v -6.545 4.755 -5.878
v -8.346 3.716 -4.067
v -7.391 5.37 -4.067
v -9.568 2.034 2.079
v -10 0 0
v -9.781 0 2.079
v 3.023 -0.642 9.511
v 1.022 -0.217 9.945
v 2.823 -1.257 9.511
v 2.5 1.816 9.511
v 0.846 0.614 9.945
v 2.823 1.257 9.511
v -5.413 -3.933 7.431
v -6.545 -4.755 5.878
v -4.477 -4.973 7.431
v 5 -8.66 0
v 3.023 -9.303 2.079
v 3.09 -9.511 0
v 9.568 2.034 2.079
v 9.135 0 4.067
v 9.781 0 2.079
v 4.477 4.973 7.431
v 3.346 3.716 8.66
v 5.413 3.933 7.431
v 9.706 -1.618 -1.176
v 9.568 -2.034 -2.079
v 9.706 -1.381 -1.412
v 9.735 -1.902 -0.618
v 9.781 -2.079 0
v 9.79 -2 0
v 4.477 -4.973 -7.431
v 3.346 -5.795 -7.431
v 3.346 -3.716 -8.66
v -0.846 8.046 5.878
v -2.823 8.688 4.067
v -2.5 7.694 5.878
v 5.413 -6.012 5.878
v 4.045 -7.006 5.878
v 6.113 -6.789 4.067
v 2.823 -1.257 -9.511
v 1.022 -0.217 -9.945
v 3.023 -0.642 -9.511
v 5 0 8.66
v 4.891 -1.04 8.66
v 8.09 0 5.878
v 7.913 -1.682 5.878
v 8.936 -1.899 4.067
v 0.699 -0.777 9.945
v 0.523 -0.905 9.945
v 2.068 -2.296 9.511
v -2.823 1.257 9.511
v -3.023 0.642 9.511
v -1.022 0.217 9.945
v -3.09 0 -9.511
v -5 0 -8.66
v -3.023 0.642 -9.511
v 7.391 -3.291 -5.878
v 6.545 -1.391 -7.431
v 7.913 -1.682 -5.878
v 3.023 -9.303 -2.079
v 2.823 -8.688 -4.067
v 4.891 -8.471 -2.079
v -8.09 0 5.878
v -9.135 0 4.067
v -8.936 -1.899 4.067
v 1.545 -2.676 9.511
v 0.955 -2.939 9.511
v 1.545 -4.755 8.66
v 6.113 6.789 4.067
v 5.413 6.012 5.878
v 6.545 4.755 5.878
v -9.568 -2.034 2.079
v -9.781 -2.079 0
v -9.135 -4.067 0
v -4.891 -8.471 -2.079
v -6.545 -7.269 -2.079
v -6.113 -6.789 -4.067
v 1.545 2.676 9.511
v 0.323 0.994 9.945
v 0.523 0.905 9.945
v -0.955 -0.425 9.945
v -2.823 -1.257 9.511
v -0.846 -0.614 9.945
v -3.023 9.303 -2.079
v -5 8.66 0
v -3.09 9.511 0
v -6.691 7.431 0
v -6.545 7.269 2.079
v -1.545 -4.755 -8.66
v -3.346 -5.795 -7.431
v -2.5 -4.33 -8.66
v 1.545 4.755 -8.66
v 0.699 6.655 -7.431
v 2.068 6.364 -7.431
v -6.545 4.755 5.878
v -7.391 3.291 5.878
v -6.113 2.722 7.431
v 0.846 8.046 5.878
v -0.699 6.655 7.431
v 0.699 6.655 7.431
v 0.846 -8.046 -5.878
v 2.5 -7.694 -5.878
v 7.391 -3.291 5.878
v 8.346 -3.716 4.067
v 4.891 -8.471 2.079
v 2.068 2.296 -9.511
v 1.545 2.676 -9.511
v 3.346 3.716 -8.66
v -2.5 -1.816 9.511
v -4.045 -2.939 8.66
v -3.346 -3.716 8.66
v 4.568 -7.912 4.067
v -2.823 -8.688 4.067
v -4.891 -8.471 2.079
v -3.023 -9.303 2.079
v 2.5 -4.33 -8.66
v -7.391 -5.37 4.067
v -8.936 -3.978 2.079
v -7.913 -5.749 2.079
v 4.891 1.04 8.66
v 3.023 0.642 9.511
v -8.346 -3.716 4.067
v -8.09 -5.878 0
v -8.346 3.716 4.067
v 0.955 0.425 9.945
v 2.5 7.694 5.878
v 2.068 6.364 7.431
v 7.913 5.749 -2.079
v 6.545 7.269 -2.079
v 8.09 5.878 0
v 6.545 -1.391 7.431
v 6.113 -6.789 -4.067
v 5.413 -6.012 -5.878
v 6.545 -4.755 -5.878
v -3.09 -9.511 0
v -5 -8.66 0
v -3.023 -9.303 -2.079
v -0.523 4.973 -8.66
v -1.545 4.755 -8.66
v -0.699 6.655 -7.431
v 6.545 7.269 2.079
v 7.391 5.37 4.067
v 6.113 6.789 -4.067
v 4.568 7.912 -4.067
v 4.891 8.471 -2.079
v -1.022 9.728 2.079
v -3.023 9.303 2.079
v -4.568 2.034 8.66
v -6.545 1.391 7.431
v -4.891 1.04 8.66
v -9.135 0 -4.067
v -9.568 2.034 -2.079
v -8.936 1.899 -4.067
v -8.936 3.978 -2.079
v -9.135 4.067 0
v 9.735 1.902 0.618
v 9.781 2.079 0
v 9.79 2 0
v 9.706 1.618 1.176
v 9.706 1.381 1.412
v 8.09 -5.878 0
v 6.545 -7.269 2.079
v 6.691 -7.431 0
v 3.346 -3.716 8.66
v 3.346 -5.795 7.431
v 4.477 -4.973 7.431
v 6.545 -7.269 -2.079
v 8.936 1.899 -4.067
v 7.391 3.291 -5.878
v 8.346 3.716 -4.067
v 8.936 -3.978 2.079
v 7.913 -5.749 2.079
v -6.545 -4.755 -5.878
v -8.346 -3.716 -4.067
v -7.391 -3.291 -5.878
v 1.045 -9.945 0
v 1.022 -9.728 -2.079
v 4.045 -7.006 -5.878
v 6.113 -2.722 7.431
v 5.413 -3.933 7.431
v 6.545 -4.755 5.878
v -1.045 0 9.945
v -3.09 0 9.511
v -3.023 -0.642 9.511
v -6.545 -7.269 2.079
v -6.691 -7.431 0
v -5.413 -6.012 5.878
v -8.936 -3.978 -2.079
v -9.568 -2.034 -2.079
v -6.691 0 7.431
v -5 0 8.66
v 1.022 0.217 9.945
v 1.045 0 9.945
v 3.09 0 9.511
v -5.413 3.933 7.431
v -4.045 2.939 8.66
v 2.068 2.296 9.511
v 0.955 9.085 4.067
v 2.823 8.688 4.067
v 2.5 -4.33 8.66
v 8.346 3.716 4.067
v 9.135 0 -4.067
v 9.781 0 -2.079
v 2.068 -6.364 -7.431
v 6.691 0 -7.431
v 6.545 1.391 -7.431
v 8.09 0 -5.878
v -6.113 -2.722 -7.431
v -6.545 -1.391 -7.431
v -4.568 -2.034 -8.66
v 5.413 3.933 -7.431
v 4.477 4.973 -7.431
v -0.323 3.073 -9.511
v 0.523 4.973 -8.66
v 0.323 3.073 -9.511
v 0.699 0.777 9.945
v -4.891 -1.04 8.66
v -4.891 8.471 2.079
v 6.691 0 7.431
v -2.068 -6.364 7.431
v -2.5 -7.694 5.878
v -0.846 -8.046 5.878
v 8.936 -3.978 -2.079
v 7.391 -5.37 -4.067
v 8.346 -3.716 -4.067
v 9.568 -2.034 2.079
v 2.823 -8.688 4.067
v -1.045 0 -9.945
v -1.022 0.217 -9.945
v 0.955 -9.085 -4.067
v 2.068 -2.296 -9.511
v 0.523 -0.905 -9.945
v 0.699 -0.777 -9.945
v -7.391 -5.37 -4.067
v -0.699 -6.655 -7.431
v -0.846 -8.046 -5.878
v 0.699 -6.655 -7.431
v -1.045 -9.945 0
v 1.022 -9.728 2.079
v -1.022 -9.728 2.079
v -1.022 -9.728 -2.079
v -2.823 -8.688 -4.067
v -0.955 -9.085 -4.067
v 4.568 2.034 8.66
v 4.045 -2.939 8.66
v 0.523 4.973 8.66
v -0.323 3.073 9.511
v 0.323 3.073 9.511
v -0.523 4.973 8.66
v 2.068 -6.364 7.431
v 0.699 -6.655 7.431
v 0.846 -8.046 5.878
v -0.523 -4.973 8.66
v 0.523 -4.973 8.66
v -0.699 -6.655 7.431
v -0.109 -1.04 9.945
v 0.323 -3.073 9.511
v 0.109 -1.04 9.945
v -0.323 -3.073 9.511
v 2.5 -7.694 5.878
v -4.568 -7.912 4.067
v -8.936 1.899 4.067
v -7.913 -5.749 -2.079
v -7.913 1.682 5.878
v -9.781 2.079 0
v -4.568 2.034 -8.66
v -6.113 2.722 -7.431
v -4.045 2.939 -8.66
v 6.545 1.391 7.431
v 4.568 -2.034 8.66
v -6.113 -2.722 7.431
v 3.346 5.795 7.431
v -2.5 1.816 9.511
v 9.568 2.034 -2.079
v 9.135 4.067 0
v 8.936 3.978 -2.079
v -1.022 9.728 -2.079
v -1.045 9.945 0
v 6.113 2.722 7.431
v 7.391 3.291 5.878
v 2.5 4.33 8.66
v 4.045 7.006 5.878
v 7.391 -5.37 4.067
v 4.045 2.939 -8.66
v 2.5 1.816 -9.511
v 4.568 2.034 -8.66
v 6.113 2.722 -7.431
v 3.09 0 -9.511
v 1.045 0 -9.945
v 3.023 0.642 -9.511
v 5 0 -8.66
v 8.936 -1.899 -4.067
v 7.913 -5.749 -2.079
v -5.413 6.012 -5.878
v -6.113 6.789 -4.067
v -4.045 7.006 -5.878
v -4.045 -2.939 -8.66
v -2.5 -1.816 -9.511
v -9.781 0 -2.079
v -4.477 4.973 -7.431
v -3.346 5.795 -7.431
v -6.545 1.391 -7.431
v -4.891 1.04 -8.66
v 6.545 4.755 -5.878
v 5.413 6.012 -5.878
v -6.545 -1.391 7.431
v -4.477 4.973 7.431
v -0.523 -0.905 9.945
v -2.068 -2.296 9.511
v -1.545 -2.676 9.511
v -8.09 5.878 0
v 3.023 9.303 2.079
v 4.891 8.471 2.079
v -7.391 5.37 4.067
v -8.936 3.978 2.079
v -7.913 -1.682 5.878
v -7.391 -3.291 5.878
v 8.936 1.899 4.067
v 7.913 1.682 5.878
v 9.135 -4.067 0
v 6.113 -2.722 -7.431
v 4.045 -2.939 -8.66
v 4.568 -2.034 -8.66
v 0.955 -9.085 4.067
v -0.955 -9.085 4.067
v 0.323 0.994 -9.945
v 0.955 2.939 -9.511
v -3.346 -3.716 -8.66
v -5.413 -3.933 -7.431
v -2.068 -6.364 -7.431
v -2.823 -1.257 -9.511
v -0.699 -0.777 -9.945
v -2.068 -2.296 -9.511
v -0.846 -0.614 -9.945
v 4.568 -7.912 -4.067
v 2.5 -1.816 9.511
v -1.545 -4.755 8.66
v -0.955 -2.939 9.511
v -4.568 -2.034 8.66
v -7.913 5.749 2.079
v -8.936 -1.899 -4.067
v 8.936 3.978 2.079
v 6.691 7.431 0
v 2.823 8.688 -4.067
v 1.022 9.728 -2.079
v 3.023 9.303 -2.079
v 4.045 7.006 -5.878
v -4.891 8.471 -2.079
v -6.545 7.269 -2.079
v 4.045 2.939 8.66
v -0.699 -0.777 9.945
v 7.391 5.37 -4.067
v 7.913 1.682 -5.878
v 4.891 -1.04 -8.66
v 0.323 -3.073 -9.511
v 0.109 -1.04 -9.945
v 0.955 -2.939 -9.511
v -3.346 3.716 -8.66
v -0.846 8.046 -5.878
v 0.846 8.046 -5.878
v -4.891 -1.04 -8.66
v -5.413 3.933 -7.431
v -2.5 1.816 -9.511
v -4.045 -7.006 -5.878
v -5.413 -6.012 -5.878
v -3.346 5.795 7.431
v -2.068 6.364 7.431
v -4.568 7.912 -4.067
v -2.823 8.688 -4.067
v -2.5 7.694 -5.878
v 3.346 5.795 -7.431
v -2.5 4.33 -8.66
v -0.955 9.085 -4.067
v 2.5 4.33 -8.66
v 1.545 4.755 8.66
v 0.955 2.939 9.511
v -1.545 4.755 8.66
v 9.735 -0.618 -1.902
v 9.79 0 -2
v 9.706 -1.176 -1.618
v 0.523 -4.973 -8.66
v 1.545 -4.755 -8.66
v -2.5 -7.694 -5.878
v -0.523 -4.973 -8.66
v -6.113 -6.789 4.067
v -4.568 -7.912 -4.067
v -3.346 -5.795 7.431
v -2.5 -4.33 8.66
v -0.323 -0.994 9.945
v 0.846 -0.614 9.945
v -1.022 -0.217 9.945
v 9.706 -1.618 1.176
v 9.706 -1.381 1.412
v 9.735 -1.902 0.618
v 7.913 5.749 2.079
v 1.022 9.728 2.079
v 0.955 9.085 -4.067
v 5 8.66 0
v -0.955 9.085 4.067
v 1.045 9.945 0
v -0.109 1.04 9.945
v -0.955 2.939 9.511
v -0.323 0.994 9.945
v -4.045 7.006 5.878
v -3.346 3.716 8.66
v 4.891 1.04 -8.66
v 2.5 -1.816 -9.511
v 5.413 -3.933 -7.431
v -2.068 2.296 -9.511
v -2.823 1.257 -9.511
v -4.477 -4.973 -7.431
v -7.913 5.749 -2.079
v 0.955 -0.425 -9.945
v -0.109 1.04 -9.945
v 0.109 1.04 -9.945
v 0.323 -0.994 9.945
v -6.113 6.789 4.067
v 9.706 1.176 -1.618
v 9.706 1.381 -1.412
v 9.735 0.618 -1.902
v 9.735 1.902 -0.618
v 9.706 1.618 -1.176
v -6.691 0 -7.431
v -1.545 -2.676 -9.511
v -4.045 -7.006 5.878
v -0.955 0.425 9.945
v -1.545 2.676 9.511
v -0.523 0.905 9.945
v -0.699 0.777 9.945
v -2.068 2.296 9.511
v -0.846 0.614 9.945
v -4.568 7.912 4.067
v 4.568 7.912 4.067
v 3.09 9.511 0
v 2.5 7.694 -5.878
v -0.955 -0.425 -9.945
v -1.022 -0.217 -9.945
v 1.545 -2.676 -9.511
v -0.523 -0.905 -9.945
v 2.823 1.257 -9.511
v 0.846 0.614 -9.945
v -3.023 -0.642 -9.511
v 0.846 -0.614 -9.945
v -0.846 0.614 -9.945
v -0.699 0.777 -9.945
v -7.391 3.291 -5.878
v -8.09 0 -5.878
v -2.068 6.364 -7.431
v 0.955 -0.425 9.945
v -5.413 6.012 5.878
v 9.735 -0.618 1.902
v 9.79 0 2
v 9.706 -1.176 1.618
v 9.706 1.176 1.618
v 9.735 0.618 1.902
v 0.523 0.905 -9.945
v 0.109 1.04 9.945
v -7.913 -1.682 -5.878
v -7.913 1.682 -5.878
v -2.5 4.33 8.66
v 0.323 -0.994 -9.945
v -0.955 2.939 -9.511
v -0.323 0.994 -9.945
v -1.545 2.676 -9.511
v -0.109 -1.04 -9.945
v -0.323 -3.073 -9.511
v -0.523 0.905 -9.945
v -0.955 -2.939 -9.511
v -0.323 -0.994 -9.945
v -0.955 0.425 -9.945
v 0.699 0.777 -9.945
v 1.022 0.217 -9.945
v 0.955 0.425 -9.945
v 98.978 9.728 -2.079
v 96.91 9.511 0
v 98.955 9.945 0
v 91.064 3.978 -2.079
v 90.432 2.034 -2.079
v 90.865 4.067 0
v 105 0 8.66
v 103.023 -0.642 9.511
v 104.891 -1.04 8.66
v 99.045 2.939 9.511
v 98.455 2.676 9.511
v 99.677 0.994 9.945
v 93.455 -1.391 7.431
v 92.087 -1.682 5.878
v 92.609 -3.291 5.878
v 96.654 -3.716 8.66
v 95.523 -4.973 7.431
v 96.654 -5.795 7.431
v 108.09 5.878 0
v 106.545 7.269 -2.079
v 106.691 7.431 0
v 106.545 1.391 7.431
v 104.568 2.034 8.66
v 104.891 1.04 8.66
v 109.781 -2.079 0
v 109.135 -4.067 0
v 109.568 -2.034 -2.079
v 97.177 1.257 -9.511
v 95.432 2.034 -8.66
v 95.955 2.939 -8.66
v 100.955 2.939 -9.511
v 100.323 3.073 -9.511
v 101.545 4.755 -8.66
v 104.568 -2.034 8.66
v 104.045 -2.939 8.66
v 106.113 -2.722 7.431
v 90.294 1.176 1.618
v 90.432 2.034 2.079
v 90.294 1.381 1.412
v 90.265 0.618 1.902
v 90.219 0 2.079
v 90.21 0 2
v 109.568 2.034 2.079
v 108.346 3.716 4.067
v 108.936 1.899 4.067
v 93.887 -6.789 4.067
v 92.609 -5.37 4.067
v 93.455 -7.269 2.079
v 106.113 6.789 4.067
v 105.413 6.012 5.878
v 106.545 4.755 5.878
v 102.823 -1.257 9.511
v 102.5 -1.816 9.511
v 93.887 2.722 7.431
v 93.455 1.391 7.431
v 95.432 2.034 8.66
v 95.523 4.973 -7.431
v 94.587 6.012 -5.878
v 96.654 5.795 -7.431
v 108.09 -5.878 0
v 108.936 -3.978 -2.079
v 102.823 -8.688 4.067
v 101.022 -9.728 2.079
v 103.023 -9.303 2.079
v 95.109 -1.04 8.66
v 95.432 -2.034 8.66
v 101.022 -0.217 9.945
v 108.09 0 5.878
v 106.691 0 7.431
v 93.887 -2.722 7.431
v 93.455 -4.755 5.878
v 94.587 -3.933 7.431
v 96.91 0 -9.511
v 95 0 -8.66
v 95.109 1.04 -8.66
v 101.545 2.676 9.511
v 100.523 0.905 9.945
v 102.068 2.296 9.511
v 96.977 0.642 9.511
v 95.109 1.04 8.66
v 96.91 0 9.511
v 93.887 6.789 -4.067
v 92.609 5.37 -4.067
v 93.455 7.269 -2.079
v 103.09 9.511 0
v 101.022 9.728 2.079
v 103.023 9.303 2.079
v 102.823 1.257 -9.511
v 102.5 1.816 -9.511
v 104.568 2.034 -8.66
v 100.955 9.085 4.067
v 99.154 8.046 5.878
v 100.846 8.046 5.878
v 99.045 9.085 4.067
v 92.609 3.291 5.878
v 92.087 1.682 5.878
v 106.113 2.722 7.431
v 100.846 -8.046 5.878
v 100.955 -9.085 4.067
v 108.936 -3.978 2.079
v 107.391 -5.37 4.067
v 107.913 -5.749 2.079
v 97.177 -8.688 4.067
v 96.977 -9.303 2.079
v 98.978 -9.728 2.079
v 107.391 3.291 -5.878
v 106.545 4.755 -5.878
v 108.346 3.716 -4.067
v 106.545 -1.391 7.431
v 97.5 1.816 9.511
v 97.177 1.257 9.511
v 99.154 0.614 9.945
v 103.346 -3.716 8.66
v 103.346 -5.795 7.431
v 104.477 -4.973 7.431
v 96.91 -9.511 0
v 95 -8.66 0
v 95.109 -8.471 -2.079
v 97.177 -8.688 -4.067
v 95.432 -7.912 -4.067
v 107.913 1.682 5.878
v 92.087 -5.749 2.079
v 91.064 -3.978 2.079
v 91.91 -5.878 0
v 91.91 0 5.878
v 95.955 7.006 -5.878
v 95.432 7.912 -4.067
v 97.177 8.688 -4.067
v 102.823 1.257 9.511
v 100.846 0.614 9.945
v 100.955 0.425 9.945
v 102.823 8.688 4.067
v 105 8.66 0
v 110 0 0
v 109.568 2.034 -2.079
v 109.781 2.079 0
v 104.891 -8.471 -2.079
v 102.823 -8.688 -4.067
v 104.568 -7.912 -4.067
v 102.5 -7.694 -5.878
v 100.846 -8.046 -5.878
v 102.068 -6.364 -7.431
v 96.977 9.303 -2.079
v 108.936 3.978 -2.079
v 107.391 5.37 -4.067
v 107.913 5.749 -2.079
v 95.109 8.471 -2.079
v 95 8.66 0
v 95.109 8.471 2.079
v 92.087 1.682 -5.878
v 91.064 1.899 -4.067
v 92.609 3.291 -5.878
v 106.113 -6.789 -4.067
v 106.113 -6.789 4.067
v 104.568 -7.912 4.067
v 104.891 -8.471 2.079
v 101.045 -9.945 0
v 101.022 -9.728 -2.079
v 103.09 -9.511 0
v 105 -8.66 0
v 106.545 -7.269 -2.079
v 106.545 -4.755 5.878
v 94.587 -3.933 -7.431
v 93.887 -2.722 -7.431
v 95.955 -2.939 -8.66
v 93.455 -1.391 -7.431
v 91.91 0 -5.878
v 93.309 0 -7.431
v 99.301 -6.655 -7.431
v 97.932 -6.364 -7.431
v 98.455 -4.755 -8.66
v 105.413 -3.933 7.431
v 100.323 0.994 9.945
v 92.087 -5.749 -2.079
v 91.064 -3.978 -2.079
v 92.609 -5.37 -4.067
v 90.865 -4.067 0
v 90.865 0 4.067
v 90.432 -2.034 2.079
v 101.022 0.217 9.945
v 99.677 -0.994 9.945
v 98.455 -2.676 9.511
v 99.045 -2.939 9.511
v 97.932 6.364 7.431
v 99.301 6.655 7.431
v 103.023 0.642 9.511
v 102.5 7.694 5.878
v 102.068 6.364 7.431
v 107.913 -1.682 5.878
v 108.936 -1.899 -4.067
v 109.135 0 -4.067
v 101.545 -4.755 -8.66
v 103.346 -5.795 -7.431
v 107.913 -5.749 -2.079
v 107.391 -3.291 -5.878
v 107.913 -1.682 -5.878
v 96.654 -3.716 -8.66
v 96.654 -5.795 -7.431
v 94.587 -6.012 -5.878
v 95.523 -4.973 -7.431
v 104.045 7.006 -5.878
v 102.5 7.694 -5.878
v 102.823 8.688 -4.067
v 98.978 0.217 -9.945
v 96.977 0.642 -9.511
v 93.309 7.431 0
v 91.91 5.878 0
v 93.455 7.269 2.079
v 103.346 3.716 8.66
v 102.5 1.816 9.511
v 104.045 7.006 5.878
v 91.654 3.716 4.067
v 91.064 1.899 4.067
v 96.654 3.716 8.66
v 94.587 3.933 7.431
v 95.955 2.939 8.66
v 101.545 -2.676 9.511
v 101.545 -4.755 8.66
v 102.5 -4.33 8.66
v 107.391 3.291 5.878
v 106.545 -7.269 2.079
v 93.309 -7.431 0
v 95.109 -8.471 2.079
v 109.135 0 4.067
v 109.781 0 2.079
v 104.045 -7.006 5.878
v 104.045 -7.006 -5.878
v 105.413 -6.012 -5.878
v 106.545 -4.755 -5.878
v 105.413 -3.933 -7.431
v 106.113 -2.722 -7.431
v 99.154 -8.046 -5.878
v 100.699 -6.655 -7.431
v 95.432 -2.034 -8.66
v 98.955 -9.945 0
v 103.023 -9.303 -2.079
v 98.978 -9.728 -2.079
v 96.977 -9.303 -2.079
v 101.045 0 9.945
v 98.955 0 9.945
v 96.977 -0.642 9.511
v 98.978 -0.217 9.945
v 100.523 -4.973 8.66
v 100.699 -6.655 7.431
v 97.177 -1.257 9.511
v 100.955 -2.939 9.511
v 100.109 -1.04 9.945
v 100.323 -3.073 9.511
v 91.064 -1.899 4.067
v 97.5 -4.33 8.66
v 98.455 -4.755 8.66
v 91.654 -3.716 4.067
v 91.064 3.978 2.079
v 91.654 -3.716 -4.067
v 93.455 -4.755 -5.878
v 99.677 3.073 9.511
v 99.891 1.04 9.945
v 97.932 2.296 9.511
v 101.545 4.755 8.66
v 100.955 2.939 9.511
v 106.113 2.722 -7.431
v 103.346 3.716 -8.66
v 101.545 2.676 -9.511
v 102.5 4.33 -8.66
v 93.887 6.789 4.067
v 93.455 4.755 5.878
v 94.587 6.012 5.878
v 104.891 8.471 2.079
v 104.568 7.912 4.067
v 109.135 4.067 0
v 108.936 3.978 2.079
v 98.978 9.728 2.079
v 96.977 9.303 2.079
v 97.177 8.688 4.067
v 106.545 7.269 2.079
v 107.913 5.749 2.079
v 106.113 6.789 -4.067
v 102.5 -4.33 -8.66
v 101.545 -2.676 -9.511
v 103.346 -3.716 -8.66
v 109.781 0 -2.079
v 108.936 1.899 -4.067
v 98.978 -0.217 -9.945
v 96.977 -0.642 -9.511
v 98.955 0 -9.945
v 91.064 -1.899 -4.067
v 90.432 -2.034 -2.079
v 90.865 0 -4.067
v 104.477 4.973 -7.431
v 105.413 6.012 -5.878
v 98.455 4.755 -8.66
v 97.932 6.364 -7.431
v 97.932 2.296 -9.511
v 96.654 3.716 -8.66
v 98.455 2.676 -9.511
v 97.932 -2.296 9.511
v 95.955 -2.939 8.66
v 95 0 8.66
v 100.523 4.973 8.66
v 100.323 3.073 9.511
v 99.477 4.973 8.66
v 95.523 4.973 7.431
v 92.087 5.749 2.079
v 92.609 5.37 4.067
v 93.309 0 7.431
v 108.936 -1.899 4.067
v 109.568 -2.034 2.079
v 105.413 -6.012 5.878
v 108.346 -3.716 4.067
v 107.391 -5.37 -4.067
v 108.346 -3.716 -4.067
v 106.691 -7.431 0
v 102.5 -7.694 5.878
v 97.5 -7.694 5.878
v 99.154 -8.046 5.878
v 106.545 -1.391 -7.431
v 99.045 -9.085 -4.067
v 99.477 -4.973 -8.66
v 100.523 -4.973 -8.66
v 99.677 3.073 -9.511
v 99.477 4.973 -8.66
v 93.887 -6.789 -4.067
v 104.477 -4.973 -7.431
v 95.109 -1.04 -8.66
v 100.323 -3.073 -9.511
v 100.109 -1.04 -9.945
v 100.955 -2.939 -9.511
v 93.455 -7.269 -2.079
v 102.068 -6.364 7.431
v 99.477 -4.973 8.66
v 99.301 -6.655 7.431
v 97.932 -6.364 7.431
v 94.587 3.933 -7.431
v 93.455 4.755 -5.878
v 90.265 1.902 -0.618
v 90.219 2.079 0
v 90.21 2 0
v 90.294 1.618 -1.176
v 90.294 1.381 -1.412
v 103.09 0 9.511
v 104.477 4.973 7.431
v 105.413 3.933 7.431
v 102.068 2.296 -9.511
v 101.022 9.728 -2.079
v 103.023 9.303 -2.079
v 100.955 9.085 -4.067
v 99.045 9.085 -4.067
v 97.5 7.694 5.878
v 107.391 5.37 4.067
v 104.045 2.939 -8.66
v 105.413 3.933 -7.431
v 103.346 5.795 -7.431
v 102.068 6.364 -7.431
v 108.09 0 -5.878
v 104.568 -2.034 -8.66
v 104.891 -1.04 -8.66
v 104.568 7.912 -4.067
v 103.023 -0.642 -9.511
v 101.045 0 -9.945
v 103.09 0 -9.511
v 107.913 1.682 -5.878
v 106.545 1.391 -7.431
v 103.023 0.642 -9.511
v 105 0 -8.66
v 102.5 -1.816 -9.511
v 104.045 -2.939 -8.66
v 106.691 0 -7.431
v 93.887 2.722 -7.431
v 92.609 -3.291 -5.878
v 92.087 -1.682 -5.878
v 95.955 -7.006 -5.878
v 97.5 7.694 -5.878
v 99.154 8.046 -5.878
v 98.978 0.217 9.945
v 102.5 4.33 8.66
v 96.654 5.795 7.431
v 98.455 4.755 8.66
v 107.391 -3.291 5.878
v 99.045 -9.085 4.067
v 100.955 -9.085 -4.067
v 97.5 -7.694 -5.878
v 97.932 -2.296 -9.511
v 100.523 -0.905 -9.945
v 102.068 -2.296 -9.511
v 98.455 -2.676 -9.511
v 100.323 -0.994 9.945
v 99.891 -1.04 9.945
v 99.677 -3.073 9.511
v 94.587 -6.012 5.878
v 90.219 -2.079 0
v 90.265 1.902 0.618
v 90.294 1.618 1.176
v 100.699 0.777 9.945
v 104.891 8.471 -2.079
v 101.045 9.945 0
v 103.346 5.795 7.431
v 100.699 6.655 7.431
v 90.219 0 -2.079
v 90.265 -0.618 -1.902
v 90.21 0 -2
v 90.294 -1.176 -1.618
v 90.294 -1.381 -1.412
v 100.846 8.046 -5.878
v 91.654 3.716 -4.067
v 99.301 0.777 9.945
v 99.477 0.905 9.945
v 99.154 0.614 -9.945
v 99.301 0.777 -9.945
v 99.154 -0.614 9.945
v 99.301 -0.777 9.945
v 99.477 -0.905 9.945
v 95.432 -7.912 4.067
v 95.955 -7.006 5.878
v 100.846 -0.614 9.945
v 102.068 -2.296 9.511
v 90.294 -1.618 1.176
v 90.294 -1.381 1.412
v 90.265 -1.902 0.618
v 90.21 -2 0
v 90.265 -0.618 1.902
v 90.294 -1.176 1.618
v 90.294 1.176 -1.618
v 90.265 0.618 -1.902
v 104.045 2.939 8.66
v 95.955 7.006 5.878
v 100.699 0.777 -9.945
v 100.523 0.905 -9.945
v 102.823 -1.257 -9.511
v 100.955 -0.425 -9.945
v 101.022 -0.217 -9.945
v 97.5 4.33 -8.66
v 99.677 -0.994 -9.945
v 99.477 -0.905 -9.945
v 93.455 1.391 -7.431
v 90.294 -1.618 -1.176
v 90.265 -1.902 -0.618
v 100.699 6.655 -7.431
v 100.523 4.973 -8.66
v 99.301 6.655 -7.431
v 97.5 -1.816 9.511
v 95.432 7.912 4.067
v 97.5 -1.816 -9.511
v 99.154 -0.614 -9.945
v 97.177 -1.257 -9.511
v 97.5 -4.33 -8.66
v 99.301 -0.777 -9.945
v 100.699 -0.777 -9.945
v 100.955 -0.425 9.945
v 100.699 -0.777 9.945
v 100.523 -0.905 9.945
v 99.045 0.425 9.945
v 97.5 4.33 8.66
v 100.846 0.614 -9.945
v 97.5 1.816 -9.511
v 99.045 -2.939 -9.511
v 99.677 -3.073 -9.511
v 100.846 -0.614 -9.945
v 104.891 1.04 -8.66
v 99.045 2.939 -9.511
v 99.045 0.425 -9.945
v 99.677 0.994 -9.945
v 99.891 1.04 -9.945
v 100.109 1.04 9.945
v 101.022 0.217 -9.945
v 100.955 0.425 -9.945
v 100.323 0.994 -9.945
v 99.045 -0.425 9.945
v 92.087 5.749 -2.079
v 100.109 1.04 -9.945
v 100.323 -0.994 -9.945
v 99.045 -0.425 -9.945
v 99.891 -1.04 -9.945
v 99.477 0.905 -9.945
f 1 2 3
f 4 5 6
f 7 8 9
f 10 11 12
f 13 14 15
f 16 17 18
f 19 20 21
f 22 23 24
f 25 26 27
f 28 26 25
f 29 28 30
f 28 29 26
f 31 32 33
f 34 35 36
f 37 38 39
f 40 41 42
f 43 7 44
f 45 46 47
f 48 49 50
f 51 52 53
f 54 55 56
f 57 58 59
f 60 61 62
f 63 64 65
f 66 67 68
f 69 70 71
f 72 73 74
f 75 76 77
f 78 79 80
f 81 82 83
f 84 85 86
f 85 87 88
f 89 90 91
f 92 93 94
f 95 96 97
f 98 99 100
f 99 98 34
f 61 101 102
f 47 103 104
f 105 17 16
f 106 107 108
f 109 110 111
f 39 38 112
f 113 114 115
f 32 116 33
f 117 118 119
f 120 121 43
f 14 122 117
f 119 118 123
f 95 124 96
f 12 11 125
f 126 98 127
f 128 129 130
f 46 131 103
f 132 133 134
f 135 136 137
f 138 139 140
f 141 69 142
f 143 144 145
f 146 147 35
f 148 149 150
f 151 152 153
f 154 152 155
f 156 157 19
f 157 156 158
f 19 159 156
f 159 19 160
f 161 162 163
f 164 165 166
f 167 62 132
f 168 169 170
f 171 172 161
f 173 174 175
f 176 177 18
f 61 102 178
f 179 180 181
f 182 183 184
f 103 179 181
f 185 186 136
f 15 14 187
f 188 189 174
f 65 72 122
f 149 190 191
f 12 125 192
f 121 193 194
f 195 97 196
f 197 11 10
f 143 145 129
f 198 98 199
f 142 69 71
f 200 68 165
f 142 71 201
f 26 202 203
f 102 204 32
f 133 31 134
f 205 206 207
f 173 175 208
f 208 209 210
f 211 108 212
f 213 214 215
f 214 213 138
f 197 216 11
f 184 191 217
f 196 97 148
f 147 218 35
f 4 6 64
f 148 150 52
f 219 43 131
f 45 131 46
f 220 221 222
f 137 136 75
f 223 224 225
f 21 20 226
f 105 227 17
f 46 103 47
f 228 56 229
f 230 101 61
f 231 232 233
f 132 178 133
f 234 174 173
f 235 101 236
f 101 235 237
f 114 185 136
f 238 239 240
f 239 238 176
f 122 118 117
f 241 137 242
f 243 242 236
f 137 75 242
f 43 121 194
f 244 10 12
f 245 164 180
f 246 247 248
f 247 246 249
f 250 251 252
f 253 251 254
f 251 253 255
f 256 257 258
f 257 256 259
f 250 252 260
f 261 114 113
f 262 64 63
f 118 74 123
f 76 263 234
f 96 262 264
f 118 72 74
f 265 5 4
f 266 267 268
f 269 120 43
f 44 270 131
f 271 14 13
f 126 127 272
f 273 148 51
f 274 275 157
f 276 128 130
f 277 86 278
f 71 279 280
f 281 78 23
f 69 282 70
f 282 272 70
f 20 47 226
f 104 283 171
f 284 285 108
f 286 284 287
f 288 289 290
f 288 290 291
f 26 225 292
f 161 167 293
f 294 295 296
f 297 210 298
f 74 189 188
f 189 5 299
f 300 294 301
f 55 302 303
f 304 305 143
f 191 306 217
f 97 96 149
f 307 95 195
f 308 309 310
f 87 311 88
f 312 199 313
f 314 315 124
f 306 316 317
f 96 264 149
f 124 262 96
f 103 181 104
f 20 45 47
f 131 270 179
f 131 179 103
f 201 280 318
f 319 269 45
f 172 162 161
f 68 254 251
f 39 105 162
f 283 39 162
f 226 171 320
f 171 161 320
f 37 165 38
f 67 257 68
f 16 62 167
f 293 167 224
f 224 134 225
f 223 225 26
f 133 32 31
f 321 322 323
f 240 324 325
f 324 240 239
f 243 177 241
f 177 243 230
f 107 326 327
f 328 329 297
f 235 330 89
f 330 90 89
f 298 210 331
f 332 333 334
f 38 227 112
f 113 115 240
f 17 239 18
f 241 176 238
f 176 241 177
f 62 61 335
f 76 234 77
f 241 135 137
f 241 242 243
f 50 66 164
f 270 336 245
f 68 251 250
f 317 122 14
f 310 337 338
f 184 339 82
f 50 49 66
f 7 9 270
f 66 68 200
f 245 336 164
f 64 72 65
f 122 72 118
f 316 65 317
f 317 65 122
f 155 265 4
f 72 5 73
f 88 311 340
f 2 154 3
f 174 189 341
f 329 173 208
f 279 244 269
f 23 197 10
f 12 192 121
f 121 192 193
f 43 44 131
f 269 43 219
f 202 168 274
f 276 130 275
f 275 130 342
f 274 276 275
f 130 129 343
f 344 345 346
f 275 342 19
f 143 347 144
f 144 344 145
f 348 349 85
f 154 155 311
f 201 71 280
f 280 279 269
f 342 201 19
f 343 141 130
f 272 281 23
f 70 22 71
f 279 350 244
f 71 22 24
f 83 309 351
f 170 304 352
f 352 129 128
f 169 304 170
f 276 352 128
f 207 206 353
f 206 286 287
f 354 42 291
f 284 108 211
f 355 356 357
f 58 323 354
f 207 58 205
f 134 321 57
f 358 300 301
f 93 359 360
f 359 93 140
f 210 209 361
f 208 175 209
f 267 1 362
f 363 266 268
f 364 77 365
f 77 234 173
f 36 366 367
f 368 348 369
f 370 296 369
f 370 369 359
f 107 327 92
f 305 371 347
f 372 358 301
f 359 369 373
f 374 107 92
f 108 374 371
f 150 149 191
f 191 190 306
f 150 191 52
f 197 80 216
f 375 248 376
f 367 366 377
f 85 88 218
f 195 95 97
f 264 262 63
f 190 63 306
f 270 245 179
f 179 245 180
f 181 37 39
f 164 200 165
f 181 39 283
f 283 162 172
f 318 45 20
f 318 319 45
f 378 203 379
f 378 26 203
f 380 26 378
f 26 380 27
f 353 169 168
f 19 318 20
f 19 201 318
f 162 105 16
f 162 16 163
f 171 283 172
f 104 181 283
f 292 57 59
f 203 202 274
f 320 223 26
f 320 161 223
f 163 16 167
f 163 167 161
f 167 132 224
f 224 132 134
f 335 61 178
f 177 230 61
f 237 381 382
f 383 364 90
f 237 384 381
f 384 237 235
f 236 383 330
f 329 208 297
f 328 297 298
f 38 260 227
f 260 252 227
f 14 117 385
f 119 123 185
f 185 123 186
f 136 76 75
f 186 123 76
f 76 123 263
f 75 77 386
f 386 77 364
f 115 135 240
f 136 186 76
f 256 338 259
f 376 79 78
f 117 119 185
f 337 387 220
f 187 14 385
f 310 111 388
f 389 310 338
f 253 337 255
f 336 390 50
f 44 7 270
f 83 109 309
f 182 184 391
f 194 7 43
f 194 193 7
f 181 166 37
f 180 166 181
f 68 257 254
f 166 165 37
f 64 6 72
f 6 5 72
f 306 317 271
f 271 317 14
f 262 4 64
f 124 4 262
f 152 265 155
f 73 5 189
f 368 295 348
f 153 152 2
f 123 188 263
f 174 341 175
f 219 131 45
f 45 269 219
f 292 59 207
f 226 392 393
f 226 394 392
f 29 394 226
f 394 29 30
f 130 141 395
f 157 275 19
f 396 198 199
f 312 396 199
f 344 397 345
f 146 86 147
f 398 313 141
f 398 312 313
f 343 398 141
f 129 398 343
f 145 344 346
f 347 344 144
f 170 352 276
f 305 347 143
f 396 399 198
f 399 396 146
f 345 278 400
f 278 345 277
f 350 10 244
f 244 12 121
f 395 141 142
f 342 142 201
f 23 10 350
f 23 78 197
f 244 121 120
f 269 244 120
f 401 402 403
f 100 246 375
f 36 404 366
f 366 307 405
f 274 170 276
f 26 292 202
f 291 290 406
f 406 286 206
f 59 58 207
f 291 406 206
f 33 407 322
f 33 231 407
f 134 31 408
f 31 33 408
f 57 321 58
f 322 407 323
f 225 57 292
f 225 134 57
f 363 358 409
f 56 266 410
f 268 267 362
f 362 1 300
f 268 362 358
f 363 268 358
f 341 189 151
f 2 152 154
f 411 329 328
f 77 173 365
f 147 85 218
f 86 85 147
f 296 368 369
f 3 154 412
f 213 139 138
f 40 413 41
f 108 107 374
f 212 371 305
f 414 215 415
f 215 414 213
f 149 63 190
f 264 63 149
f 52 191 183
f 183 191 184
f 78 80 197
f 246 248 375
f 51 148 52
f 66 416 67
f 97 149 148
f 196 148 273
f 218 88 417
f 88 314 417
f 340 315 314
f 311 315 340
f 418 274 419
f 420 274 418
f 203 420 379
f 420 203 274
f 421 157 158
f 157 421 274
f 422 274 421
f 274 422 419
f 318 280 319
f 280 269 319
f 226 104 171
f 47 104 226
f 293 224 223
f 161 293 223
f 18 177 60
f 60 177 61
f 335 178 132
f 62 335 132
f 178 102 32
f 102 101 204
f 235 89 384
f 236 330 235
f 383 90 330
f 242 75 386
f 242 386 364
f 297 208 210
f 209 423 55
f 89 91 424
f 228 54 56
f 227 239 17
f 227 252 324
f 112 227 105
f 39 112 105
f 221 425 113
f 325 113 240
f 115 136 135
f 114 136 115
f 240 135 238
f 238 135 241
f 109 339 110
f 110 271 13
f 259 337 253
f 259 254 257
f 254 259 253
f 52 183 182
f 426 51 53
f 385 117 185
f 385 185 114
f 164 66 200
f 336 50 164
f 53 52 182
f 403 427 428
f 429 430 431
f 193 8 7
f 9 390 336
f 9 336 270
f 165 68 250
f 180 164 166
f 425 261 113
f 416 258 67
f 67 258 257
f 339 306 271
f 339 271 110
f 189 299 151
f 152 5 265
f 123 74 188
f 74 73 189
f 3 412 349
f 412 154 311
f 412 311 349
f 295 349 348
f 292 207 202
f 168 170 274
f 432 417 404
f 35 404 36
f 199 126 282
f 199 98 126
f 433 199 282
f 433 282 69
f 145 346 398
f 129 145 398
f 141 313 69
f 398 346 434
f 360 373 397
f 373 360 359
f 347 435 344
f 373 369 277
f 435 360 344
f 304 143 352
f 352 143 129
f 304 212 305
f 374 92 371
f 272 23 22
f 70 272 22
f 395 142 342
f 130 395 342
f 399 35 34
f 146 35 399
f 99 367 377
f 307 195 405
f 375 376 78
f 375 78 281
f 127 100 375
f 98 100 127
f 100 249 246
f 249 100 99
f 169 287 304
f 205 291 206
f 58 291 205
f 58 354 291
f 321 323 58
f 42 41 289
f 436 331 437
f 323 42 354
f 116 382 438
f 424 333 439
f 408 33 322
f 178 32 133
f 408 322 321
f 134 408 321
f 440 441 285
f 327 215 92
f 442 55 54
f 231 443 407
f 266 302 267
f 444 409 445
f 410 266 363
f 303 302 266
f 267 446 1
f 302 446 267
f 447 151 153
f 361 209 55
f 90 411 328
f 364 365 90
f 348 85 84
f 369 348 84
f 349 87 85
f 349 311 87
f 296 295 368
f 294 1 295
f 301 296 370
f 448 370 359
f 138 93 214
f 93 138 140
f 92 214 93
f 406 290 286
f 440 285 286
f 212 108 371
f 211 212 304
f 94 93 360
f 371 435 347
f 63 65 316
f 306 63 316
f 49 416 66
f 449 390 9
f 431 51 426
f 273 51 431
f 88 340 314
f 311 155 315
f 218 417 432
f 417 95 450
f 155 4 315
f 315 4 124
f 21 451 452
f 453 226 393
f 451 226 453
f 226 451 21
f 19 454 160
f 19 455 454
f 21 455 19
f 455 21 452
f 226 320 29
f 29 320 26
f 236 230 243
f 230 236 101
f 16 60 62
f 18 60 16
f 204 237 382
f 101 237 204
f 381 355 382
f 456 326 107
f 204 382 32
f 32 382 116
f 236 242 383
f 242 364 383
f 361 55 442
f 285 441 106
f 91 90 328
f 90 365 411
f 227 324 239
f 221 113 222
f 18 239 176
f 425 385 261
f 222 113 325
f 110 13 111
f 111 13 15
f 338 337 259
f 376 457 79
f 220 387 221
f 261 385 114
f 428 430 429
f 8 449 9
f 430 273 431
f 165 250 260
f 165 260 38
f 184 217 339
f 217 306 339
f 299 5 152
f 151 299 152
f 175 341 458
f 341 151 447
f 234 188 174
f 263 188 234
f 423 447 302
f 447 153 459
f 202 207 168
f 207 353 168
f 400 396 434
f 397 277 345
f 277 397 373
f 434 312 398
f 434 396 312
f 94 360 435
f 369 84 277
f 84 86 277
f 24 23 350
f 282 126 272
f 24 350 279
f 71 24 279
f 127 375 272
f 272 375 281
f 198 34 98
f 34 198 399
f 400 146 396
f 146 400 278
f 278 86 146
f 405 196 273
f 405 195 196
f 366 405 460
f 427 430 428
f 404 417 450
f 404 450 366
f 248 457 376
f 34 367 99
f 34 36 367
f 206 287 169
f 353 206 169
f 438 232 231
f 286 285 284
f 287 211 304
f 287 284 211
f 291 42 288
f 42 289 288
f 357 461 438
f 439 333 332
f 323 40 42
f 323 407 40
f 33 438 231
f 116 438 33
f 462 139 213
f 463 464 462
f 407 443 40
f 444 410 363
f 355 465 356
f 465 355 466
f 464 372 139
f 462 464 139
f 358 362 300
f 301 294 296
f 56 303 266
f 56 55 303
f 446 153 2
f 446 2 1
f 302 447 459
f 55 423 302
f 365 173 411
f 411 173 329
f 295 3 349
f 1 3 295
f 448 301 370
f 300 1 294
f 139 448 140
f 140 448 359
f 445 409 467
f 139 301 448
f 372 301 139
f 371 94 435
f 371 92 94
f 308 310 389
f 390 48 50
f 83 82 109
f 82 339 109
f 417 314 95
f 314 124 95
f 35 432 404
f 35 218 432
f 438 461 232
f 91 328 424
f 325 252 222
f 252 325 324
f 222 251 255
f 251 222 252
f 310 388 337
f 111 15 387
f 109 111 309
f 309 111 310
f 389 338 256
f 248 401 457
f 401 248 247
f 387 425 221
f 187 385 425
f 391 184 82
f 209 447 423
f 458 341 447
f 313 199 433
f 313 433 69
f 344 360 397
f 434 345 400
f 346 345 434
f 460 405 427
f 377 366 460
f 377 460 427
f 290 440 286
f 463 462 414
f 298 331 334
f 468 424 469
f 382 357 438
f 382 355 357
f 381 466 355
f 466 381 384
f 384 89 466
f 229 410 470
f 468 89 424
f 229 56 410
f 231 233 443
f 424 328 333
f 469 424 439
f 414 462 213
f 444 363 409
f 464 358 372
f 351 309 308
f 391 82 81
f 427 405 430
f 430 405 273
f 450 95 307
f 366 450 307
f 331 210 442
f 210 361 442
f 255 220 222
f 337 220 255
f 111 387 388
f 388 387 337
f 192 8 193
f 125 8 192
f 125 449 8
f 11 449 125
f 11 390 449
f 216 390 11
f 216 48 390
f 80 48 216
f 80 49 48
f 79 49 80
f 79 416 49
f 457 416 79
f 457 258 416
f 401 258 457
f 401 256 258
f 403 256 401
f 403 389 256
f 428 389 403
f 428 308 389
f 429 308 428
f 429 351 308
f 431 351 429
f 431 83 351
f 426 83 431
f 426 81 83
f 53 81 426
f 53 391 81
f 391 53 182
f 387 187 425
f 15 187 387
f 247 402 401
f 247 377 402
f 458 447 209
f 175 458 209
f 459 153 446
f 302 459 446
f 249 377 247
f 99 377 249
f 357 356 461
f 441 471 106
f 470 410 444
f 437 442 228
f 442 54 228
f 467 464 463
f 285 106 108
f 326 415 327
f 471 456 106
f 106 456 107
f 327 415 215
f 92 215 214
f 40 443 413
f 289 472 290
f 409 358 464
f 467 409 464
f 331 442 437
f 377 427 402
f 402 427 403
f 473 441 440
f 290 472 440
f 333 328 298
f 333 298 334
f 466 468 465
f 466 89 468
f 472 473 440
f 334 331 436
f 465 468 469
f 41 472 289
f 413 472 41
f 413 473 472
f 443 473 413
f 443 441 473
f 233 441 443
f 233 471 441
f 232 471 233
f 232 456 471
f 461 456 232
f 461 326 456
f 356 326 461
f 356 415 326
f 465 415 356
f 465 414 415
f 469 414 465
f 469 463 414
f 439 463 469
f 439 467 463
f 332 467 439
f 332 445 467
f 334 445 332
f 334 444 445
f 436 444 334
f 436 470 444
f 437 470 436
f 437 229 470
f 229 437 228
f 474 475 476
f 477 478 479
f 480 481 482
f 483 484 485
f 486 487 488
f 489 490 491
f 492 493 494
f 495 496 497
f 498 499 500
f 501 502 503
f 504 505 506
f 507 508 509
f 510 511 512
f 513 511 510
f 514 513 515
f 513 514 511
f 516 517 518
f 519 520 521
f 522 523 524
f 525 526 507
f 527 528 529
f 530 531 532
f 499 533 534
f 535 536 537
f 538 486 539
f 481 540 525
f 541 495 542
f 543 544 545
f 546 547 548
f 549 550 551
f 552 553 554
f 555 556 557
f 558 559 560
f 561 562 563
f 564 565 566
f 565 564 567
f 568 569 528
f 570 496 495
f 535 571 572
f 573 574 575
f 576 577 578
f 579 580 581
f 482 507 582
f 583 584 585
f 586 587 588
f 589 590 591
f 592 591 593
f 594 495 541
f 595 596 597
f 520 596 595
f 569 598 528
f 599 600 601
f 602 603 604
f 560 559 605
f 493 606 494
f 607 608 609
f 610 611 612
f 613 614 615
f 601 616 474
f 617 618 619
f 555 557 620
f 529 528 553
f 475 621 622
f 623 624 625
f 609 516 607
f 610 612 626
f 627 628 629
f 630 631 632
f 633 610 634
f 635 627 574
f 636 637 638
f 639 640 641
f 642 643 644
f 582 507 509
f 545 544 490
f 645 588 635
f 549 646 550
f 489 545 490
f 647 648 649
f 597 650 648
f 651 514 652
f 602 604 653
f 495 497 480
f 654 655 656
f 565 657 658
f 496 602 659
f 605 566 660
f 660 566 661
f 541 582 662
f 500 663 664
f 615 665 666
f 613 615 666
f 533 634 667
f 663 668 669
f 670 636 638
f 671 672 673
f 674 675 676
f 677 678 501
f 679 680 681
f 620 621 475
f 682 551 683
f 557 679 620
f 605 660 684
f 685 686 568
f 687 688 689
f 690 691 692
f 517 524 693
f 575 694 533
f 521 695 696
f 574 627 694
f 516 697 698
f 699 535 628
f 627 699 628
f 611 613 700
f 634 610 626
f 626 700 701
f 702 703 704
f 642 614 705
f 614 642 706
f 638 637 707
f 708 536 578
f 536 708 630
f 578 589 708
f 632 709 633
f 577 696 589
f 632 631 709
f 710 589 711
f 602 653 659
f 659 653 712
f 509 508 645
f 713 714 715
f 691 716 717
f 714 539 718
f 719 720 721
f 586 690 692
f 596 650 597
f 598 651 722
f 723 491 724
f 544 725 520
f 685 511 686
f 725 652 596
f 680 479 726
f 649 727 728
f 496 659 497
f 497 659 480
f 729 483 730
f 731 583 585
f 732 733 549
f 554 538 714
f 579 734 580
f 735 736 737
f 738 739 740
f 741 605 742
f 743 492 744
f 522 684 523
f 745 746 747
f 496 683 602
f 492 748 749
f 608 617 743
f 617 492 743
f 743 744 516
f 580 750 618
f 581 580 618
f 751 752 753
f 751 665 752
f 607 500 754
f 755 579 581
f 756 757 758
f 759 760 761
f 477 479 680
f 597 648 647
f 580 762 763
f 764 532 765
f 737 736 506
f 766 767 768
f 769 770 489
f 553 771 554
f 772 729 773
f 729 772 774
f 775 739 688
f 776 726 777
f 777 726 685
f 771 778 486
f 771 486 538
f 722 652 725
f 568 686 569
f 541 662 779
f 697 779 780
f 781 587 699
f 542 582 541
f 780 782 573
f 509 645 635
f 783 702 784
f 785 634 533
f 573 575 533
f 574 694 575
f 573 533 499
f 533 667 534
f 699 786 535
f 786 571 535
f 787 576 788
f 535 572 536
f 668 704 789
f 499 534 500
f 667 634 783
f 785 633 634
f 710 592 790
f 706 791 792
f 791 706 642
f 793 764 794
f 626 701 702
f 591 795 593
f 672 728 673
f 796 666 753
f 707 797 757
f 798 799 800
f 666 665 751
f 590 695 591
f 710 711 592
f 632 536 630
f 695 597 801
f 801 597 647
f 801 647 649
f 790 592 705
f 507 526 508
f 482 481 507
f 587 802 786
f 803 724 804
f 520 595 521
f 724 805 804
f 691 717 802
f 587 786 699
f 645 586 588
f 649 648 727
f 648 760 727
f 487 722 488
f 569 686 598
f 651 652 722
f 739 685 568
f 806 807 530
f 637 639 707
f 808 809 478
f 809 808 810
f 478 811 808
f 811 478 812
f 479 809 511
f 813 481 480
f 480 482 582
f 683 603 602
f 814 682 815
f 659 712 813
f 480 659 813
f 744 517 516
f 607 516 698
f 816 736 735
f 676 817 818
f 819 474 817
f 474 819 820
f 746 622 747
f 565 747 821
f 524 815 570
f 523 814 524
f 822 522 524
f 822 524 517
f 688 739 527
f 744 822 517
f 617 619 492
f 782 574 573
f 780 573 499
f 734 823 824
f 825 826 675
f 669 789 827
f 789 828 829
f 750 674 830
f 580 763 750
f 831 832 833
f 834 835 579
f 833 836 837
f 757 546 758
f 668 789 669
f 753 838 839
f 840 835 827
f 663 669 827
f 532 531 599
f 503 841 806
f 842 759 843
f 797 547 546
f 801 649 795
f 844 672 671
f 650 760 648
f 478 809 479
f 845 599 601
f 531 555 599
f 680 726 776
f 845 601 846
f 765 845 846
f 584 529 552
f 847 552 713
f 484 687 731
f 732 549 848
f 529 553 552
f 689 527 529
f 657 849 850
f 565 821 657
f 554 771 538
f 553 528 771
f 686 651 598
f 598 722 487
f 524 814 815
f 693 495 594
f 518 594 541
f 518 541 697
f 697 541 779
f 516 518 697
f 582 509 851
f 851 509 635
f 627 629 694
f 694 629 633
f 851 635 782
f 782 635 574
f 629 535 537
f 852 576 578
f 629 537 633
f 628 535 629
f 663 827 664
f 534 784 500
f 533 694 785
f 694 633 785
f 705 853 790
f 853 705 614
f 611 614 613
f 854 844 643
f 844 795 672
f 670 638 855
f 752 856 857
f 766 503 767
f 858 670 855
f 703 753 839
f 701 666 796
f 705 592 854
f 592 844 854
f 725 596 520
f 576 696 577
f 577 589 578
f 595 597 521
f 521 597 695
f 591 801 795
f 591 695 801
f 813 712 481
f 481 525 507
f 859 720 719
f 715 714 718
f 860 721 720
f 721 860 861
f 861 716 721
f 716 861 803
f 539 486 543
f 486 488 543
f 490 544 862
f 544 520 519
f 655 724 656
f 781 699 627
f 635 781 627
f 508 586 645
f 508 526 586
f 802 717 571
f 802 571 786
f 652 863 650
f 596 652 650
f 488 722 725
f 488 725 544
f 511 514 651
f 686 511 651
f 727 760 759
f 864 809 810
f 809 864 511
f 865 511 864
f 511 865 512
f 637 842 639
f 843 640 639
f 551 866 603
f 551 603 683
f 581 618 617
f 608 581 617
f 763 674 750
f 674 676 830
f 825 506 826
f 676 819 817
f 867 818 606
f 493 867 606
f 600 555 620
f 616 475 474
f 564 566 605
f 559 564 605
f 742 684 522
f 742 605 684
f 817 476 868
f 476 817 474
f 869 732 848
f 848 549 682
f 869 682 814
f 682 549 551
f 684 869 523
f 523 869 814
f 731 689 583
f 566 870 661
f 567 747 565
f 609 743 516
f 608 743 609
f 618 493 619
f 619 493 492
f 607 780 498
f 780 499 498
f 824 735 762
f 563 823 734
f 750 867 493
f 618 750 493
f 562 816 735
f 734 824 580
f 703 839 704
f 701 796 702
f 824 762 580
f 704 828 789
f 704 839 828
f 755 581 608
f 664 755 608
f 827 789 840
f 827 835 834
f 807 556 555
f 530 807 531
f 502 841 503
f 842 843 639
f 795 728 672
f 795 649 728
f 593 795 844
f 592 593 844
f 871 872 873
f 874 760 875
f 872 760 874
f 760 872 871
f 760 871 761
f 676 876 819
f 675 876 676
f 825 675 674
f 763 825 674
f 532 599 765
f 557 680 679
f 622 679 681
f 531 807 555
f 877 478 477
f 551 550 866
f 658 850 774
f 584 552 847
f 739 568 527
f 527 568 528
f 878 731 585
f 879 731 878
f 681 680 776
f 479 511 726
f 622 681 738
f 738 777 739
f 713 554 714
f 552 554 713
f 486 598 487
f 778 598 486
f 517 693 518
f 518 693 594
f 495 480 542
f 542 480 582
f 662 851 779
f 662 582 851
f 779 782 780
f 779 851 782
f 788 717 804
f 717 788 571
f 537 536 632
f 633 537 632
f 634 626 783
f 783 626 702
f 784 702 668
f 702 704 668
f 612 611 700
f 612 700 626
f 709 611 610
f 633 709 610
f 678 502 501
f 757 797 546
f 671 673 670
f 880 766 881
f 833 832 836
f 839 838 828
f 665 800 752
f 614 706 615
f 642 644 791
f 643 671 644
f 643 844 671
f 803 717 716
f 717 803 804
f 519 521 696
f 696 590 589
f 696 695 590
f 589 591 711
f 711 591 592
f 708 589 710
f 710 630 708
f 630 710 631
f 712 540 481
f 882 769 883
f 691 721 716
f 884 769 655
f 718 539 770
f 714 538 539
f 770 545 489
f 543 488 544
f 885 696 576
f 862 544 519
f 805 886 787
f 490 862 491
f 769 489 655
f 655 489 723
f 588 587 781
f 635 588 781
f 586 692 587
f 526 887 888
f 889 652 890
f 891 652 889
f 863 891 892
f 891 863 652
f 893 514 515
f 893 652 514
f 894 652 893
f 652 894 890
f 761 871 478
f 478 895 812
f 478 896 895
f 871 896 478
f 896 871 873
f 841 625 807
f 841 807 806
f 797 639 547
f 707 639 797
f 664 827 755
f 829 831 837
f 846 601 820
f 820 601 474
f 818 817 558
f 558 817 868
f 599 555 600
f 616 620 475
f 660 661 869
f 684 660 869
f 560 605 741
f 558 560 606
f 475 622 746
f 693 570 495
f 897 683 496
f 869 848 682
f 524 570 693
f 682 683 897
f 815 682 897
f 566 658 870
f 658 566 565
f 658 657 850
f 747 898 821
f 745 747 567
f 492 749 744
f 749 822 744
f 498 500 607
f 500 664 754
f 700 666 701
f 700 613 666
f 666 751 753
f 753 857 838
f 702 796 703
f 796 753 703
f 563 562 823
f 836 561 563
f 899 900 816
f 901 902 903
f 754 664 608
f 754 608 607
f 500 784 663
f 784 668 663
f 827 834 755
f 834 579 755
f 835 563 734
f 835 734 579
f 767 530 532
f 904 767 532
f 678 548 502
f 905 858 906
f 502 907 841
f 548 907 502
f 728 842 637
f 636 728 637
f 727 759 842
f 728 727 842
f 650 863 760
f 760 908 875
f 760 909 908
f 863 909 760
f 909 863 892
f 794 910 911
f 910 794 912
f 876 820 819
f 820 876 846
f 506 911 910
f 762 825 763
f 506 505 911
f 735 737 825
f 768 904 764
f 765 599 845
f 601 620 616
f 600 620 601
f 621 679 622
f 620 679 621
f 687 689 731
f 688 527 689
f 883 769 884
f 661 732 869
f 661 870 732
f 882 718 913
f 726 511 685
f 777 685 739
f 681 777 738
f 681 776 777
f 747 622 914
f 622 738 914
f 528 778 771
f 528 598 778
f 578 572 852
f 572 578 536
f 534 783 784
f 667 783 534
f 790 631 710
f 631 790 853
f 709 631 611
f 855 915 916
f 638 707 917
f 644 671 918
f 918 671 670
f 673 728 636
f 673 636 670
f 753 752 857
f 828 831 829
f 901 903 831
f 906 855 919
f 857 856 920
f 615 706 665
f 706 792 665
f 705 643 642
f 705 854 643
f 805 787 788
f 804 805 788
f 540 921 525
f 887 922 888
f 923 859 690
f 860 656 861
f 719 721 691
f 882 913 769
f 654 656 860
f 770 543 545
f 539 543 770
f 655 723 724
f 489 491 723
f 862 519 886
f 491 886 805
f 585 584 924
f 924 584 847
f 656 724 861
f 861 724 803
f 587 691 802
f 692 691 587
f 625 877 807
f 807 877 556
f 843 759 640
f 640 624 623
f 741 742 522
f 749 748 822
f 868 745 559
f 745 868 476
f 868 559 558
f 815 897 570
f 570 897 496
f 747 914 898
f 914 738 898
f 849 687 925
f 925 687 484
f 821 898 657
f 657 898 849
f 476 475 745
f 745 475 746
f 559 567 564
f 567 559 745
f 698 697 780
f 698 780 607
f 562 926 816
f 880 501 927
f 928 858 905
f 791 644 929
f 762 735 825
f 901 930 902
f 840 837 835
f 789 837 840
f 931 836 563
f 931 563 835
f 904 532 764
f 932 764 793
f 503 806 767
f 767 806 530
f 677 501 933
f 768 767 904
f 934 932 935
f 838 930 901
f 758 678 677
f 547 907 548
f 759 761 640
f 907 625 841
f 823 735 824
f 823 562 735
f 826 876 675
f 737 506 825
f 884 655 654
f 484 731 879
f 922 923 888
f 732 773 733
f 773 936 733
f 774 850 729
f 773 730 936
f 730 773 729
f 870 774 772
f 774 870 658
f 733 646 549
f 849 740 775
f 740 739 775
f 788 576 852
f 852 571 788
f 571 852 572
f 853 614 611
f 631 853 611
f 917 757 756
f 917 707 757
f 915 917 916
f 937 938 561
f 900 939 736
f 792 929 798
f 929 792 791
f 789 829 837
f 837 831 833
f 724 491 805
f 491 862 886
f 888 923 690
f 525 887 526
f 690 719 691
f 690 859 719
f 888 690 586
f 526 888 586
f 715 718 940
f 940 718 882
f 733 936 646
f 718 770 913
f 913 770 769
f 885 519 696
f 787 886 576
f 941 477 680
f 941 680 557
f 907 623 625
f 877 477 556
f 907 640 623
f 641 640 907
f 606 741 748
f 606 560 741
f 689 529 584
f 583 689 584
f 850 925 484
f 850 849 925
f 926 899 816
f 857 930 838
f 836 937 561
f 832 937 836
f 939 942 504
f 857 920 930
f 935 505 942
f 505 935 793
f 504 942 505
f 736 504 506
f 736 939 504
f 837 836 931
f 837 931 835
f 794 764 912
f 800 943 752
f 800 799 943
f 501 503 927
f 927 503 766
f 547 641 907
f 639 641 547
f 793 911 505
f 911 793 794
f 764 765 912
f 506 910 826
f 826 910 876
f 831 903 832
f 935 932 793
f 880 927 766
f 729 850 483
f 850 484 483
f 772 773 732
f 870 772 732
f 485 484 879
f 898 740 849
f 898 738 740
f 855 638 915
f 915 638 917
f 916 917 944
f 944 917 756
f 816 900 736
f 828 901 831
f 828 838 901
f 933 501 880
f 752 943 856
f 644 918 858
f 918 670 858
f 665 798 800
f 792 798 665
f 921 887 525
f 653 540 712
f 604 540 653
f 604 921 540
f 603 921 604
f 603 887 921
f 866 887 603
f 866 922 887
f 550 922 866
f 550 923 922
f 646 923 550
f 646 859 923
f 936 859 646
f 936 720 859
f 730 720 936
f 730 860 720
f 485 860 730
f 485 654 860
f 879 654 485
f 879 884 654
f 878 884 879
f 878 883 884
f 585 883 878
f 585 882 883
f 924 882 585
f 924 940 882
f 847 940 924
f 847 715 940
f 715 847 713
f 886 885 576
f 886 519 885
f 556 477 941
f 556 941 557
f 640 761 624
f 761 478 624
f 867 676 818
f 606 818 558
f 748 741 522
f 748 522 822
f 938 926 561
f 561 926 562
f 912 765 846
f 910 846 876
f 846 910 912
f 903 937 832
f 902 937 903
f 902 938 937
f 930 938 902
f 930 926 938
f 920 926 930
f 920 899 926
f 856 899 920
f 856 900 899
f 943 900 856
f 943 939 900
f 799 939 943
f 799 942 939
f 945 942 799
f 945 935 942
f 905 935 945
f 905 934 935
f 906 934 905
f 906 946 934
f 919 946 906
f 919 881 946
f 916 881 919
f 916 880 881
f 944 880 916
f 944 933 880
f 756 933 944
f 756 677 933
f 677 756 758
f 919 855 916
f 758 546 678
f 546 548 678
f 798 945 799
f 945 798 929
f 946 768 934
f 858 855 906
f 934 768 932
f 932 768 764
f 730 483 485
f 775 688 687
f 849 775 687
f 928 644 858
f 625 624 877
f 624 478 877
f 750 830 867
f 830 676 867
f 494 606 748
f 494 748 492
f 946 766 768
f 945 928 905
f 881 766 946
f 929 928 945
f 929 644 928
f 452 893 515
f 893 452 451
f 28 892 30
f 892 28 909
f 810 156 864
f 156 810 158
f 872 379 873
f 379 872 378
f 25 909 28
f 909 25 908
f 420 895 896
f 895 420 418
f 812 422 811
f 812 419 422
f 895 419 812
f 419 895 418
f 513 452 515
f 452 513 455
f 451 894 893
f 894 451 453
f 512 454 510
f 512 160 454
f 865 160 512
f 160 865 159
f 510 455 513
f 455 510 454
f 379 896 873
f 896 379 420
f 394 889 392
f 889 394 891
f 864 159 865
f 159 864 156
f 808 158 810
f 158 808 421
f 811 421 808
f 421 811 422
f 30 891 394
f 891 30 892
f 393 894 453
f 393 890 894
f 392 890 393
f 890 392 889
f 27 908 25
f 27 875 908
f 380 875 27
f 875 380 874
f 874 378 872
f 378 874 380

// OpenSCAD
// balls
color("gray") {
    sphere(10);
    translate([100, 0, 0]) sphere(10);
}

// bar
rotate([0,90,0]) cylinder(h = 100, r = 2, $fn = 20);
